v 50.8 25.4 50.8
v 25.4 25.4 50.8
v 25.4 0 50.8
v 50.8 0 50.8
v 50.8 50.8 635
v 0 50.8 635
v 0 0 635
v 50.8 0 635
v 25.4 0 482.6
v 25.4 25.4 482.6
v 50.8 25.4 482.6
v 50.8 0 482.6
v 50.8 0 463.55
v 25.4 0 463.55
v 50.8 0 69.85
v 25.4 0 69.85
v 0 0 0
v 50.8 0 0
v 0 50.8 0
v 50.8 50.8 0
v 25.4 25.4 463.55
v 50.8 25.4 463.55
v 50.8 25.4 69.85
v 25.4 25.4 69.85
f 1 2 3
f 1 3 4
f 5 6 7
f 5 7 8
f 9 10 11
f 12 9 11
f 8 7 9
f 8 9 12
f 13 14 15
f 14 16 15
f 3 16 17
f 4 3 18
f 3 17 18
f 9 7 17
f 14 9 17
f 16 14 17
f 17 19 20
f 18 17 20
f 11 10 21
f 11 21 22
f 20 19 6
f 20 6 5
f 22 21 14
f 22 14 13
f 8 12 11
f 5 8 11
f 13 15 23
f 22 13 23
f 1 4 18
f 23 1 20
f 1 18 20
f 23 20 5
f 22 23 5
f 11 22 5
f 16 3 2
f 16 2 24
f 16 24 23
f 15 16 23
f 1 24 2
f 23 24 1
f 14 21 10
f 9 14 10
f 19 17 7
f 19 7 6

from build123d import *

# Parameters (mm, degrees)
F0_W     = 50.8
F0_H     = 50.8
F1_DEPTH = 635
F2_W     = 25.4
F2_H     = 19.05
F3_DEPTH = 25.4


with BuildPart() as f1:
    # F0 (on Top) → F1 (new body)
    with BuildSketch(Plane.XY):
        with Locations((25.4, 25.4)):
            Rectangle(F0_W, F0_H)
    extrude(amount=F1_DEPTH)

    # F2 (on face) → F3 (cut)
    with BuildSketch(Plane.XZ):
        with Locations((38.1, 60.325)):
            Rectangle(F2_W, F2_H)
        with Locations((38.1, 473.075)):
            Rectangle(F2_W, F2_H)
    extrude(amount=-F3_DEPTH, mode=Mode.SUBTRACT)


solid = f1.part
